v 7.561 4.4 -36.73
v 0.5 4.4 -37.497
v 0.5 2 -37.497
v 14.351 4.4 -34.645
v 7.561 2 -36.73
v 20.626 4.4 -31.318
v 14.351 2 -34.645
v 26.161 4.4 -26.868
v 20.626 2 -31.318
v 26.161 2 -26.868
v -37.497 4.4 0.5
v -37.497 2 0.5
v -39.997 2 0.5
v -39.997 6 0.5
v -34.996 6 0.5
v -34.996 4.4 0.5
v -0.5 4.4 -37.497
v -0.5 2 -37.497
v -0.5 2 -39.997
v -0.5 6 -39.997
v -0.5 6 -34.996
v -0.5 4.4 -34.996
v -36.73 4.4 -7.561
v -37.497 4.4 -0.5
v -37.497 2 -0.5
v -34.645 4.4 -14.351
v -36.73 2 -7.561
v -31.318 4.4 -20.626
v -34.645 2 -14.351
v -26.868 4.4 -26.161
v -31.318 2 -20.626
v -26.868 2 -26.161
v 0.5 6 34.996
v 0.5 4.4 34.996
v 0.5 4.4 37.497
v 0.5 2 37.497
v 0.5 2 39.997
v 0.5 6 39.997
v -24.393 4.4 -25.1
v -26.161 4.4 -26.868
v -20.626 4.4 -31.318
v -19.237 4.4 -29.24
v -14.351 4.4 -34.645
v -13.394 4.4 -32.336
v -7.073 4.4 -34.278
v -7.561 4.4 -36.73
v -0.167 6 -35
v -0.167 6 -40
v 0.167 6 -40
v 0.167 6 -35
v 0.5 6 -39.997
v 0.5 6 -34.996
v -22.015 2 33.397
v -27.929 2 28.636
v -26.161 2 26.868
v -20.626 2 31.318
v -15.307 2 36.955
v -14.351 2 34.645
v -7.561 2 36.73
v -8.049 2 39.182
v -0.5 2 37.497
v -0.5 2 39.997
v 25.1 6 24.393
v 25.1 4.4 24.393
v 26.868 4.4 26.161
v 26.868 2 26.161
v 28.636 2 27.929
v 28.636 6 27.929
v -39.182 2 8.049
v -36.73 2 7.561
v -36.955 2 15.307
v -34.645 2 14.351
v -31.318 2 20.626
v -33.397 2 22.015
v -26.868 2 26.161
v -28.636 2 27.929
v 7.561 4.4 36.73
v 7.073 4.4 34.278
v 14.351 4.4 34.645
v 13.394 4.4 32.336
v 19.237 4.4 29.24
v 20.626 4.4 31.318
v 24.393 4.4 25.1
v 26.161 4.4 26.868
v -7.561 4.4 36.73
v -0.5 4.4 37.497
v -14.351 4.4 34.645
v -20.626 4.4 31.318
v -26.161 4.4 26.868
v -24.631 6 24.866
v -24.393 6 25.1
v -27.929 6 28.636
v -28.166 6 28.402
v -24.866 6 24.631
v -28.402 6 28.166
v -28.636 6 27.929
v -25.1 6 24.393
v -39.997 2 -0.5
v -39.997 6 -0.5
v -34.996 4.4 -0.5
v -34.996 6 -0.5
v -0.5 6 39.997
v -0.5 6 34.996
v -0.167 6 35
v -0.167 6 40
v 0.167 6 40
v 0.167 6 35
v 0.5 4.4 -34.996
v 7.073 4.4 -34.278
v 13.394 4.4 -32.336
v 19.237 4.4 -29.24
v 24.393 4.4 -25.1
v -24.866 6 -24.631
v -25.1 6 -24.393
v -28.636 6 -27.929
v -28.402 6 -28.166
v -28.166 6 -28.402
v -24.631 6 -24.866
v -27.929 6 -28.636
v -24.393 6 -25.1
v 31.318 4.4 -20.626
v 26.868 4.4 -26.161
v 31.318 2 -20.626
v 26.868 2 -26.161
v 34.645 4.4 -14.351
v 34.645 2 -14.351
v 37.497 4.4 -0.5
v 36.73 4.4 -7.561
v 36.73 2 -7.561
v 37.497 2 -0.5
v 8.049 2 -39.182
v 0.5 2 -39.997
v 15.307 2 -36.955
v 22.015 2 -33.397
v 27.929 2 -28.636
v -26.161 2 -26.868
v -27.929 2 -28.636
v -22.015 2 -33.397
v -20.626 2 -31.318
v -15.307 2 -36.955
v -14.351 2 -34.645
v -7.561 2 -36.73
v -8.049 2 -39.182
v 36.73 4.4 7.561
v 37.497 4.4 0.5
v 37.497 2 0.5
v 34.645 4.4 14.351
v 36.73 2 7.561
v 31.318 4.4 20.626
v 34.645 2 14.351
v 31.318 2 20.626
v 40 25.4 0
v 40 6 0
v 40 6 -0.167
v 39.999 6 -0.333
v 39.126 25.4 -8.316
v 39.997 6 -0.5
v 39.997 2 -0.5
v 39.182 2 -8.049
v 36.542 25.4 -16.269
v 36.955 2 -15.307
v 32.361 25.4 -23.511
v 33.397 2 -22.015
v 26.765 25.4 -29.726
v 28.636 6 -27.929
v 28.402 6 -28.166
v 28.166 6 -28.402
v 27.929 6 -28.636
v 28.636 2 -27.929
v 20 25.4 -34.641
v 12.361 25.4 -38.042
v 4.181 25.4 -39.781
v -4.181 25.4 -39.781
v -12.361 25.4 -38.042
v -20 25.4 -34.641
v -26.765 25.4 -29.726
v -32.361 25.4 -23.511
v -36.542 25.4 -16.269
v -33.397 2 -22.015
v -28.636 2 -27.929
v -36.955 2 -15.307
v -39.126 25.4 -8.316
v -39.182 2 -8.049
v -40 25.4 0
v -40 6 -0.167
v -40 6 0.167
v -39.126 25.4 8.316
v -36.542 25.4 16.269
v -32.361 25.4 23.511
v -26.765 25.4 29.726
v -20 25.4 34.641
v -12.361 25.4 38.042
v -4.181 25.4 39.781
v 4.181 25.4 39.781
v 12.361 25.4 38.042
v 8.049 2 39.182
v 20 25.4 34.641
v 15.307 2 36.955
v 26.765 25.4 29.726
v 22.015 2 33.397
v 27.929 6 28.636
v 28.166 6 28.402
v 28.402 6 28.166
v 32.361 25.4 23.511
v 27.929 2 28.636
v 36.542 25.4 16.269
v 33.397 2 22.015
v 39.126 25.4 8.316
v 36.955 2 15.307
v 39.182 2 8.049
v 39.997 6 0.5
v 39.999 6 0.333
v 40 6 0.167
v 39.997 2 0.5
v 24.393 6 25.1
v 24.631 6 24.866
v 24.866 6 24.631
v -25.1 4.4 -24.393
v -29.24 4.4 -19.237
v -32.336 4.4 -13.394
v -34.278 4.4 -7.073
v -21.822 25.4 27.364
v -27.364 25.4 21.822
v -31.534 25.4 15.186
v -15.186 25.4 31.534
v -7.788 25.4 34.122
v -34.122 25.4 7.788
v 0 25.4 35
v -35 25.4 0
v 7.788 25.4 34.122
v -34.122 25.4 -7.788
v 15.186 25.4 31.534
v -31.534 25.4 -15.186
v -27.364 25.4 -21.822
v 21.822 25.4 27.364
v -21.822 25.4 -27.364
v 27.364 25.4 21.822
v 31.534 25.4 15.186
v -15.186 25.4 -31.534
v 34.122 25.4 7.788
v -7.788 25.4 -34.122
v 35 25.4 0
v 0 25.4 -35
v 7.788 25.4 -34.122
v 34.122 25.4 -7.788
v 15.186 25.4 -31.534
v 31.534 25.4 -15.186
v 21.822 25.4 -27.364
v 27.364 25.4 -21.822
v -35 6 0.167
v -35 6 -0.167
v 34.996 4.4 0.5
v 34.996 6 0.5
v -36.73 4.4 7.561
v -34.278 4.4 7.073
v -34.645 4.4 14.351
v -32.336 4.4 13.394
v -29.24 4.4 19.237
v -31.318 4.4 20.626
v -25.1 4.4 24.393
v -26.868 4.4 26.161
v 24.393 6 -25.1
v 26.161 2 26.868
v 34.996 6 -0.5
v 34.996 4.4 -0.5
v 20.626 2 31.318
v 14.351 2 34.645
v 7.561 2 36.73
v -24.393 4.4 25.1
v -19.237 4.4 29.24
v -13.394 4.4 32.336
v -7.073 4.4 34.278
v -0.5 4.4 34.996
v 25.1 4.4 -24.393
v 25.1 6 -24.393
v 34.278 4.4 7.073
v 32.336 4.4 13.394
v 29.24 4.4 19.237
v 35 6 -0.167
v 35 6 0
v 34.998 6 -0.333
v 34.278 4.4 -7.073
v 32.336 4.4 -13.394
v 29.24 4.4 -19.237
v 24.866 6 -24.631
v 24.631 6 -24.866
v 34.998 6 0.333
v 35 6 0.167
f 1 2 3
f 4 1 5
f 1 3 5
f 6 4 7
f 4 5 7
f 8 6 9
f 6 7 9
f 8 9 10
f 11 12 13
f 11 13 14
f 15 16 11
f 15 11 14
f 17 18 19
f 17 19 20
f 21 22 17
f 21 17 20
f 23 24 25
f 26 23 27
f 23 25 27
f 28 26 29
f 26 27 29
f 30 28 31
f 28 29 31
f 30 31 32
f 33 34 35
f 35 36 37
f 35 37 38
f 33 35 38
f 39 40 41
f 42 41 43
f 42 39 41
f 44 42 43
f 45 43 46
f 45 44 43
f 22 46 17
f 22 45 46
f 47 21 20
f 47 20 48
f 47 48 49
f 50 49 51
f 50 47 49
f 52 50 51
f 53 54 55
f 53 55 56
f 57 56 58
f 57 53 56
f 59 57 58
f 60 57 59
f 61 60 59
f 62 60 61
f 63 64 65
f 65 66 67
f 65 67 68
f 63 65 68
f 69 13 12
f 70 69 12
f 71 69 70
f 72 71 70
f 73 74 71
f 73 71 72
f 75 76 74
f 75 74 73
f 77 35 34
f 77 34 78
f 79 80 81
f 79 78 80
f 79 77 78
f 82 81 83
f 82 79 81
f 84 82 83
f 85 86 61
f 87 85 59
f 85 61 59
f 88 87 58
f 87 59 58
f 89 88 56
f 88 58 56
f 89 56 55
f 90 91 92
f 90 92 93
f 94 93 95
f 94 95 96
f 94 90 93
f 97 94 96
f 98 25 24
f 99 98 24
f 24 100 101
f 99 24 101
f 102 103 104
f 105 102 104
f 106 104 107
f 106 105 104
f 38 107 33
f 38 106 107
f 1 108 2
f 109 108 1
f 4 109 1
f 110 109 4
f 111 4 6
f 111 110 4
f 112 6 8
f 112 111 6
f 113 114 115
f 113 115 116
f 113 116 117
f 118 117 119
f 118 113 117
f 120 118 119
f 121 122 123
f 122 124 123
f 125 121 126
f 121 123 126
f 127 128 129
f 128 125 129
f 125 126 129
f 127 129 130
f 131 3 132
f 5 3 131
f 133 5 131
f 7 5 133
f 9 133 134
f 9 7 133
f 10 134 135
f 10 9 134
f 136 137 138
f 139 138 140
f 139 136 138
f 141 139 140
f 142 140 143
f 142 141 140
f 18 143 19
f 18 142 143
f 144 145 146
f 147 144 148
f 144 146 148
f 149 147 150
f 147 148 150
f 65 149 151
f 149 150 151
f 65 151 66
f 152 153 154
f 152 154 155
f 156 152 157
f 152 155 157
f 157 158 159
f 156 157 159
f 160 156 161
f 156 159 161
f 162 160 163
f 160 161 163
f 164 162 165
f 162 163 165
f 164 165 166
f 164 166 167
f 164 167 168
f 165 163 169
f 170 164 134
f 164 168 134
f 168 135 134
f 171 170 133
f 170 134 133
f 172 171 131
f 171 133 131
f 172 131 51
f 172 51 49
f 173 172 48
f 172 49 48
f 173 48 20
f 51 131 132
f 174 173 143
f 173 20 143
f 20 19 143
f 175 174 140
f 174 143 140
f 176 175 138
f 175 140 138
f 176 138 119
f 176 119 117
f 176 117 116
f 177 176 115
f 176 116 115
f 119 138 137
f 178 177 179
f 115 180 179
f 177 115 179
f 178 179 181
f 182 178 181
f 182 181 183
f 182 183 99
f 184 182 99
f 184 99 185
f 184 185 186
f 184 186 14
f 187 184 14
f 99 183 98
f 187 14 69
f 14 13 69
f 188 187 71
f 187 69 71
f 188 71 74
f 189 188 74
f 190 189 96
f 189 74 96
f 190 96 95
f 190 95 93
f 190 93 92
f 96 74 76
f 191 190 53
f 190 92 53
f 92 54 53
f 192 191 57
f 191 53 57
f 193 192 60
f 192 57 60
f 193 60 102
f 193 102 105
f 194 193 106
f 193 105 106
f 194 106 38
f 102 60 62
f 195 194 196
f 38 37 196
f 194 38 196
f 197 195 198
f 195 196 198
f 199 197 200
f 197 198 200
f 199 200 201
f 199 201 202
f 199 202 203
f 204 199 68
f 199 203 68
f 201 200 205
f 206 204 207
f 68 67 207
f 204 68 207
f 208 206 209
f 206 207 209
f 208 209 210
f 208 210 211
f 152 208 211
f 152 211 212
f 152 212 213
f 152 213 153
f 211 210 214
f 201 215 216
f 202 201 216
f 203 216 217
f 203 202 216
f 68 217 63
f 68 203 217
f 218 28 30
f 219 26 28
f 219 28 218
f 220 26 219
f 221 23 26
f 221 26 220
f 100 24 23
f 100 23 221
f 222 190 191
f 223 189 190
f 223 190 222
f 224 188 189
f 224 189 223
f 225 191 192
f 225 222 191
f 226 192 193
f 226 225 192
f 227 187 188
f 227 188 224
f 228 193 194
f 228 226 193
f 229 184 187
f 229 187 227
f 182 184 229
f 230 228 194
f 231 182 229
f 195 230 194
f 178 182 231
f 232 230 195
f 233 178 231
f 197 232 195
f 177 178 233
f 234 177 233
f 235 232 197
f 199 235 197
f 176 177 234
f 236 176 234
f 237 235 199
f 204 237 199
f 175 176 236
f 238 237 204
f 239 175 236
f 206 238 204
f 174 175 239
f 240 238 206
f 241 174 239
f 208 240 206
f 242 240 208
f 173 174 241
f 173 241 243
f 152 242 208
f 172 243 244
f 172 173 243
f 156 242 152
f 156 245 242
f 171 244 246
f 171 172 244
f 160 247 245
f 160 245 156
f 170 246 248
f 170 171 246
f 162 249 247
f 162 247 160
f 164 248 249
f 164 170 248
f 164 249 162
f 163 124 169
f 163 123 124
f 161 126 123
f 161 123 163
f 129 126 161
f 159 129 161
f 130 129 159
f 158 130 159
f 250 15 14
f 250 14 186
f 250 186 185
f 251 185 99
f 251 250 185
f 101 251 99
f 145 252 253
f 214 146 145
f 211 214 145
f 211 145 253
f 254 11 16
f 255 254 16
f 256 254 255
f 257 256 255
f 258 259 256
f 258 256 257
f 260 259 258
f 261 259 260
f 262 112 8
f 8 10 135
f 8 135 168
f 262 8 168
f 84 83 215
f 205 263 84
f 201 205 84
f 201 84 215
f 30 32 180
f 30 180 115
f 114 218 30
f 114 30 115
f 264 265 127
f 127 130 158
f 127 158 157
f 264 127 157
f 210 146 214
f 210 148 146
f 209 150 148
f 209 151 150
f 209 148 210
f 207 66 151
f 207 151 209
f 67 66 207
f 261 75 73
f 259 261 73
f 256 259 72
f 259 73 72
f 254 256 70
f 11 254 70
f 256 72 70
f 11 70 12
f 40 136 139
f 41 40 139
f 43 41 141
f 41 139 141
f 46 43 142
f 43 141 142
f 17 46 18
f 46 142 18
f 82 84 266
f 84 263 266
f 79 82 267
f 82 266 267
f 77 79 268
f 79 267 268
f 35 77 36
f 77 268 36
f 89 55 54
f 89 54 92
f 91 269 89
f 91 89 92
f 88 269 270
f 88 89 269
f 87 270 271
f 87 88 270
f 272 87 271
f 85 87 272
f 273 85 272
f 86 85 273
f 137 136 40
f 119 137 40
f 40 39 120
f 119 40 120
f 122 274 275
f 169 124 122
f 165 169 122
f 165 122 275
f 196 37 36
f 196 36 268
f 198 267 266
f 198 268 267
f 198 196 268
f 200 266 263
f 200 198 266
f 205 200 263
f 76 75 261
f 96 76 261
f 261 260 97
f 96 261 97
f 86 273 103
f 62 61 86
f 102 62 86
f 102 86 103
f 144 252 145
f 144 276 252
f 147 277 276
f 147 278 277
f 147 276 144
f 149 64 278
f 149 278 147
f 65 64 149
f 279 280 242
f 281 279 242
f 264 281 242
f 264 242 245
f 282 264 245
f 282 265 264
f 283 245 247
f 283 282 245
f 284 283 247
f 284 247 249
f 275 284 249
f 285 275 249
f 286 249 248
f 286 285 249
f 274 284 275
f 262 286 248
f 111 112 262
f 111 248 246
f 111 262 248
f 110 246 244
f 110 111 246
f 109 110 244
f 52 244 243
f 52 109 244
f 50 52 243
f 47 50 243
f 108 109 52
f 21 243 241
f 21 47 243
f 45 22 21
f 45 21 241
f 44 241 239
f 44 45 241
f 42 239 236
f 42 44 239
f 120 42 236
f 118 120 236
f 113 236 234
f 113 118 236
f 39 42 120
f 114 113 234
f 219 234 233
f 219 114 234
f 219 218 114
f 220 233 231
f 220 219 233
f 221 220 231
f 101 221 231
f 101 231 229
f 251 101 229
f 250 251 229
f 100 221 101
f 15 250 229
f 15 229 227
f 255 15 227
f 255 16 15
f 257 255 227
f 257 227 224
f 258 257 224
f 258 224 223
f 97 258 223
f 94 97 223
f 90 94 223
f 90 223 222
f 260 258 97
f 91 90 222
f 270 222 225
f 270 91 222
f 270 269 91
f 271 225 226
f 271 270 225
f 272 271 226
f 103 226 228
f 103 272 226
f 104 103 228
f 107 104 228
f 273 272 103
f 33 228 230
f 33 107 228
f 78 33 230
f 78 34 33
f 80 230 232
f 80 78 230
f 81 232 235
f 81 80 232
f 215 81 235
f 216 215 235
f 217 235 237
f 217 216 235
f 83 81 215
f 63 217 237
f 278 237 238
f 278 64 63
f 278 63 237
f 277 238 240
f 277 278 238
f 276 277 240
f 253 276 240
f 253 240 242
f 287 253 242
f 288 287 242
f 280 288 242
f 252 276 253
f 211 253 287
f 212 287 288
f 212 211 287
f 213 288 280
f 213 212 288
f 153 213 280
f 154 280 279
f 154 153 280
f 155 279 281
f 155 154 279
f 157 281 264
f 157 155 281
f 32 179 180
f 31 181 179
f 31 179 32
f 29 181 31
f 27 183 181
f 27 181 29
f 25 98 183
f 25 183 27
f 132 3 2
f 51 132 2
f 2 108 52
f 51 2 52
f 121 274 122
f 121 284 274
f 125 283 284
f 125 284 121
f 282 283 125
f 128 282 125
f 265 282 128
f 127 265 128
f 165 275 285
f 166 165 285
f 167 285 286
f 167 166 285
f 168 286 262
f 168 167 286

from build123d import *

# Parameters (mm, degrees)
SKETCH1_R           = 40
SKETCH1_R_2         = 35
BOSS_EXTRUDE1_DEPTH = 25.4
SKETCH2_R           = 37.5
SKETCH2_R_2         = 35
CUT_EXTRUDE1_DEPTH  = 4.4
SKETCH3_W           = 1
SKETCH3_H           = 6
CUT_EXTRUDE2_DEPTH  = 41
CIRPATTERN1_COUNT   = 4
CIRPATTERN1_ANGLE   = 135
SKETCH4_R           = 45.877575429
CUT_EXTRUDE3_DEPTH  = 2


with BuildPart() as part:
    # Sketch1 → Boss-Extrude1 (new body)
    with BuildSketch(Plane(origin=(0, 0, 0), x_dir=(1, 0, 0), z_dir=(0, 1, 0))):
        Circle(SKETCH1_R)
        Circle(SKETCH1_R_2, mode=Mode.SUBTRACT)
    extrude(amount=BOSS_EXTRUDE1_DEPTH)

    # Sketch2 → Cut-Extrude1 (cut)
    with BuildSketch(Plane.XZ):
        Circle(SKETCH2_R)
        Circle(SKETCH2_R_2, mode=Mode.SUBTRACT)
    extrude(amount=-CUT_EXTRUDE1_DEPTH, mode=Mode.SUBTRACT)

    # Sketch3 → Cut-Extrude2 (cut, symmetric)
    with BuildSketch(Plane.XY):
        with Locations((0, 3)):
            Rectangle(SKETCH3_W, SKETCH3_H)
    cut_extrude2 = extrude(amount=CUT_EXTRUDE2_DEPTH, both=True, mode=Mode.SUBTRACT)

    # CirPattern1: Cut-Extrude2 ×4 about axis
    cirpattern1_axis = Axis((0, 0, 0), (0, 1, 0))
    for i in range(1, CIRPATTERN1_COUNT):
        add(cut_extrude2.rotate(cirpattern1_axis, i * CIRPATTERN1_ANGLE / (CIRPATTERN1_COUNT - 1)), mode=Mode.SUBTRACT)

    # Sketch4 → Cut-Extrude3 (cut)
    with BuildSketch(Plane.XZ):
        Circle(SKETCH4_R)
    extrude(amount=-CUT_EXTRUDE3_DEPTH, mode=Mode.SUBTRACT)


solid = part.part
